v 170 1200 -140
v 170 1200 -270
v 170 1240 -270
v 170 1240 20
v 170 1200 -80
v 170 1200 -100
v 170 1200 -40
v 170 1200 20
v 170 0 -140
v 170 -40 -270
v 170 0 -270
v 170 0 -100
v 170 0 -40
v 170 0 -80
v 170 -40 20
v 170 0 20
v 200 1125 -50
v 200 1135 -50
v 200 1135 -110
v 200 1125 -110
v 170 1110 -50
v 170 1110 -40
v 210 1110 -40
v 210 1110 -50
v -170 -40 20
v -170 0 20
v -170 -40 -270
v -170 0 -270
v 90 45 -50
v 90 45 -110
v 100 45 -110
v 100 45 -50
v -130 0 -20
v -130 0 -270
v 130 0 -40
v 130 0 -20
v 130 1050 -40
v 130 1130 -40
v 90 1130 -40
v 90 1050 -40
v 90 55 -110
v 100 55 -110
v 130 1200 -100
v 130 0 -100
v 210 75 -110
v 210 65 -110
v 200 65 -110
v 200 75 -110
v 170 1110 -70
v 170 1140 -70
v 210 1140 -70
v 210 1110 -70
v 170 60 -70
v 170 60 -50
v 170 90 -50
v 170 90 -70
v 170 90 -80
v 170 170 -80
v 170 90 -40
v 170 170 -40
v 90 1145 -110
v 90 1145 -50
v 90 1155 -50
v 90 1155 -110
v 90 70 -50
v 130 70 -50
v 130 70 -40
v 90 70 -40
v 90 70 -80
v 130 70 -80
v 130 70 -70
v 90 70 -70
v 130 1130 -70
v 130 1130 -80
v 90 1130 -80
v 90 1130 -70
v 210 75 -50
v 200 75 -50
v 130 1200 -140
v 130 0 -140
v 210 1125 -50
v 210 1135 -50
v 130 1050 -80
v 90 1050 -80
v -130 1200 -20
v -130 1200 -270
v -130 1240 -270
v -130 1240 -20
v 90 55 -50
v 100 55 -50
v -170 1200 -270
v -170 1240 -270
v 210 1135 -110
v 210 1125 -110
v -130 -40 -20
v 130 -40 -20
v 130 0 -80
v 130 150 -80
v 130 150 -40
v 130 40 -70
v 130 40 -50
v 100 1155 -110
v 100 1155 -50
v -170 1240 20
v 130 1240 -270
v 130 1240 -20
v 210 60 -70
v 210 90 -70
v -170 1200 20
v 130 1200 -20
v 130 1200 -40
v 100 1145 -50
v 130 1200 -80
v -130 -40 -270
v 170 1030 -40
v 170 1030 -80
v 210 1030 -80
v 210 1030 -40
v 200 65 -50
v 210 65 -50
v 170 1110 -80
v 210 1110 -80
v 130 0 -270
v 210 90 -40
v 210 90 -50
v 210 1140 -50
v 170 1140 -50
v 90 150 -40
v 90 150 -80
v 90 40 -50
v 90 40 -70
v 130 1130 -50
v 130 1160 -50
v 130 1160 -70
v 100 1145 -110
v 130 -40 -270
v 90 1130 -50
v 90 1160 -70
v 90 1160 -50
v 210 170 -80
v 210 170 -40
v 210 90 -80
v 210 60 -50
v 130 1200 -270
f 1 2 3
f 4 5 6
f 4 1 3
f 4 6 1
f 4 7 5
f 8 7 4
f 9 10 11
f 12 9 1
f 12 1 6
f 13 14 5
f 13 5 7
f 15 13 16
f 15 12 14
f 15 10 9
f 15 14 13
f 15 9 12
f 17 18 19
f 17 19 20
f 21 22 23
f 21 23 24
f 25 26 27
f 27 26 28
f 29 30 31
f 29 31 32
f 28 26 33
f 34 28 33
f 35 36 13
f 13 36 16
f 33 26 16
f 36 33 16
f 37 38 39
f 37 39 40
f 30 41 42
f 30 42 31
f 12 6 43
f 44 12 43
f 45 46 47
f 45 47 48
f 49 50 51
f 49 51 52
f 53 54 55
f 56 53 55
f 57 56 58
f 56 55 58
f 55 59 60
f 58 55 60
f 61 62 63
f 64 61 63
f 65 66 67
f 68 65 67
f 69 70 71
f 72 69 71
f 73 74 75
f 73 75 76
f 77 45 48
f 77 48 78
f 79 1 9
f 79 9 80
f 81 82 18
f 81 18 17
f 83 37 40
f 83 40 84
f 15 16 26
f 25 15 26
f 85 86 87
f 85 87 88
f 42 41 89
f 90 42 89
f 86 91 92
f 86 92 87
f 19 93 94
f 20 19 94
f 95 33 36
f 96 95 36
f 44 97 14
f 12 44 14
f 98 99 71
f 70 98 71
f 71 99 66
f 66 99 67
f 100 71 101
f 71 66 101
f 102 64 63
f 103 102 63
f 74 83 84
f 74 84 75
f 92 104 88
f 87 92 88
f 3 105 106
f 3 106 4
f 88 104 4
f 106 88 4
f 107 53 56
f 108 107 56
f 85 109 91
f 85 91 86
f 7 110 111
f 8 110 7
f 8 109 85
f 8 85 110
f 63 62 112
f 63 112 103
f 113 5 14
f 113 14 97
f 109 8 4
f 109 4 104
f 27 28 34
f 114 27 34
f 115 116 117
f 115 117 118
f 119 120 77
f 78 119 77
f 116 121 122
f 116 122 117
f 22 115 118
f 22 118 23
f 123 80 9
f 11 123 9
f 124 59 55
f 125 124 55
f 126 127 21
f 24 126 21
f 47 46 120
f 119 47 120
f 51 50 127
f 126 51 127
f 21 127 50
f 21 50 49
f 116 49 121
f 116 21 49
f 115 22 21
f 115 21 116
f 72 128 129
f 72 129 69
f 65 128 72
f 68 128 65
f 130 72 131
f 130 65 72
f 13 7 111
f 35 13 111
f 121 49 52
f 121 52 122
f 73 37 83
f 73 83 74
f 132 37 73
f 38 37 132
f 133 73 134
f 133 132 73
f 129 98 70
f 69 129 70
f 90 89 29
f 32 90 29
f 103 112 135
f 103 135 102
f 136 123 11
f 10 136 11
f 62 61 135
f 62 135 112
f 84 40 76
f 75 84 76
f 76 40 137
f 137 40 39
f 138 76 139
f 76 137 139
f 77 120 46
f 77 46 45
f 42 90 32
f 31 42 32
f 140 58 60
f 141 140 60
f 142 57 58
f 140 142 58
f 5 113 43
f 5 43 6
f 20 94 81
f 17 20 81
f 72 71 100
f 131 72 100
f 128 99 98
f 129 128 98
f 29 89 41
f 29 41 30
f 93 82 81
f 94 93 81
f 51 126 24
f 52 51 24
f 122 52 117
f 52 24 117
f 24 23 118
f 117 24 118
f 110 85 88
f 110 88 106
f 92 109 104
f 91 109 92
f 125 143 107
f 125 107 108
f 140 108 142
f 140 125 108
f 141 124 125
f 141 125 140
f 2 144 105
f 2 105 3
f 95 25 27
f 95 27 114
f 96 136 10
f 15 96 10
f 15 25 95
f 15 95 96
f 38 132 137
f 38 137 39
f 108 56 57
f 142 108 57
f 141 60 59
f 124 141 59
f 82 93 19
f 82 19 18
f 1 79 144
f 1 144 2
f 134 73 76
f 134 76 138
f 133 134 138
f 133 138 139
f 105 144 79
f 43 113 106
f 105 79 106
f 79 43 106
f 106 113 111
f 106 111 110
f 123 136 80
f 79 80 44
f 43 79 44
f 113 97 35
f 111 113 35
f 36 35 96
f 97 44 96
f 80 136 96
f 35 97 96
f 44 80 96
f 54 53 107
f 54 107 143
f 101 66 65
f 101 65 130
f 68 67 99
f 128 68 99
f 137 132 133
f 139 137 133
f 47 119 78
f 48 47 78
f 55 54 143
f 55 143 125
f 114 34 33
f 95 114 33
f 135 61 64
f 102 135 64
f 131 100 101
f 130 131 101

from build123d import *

# Parameters (mm, degrees)
F0_W      = 40
F0_H      = 250
F1_DEPTH  = 40
F2_W      = 40
F2_H      = 40
F3_DEPTH  = 600
F4_W      = 30
F4_H      = 20
F5_DEPTH  = 40
F6_W      = 10
F6_H      = 60
F7_DEPTH  = 10
F8_W      = 30
F8_H      = 20
F9_DEPTH  = 40
F10_W     = 10
F10_H     = 60
F11_DEPTH = 10


with BuildPart() as f1:
    # F0 (on Front) → F1 (new body)
    with BuildSketch(Plane.XZ):
        Polygon((170, 20), (-170, 20), (-170, -20), (-130, -20), (130, -20), (170, -20), align=None)
        with Locations((-150, -145)):
            Rectangle(F0_W, F0_H)
        with Locations((150, -145)):
            Rectangle(F0_W, F0_H)
    extrude(amount=F1_DEPTH)

    # F2 (on face) → F3 (join)
    with BuildSketch(Plane(origin=(0, 0, 0), x_dir=(-1, 0, 0), z_dir=(0, 1, 0))):
        with Locations((-150, -60)):
            Rectangle(F2_W, F2_H)
        with Locations((-150, -120)):
            Rectangle(F2_W, F2_H)
    extrude(amount=F3_DEPTH)

    # F13: F1 across face


with BuildPart() as f5:
    # F4 (on face) → F5 (new body)
    with BuildSketch(Plane.YZ.offset(170)):
        Polygon((170, -80), (170, -40), (90, -40), (90, -50), (90, -70), (90, -80), align=None)
        with Locations((75, -60)):
            Rectangle(F4_W, F4_H)
    extrude(amount=F5_DEPTH)


with BuildPart() as f7:
    # F6 (on face) → F7 (new body)
    with BuildSketch(Plane.YZ.offset(210)):
        with Locations((70, -80)):
            Rectangle(F6_W, F6_H)
    extrude(amount=-F7_DEPTH)


with BuildPart() as f9:
    # F8 (on face) → F9 (new body)
    with BuildSketch(Plane(origin=(130, 0, 0), x_dir=(0, -1, 0), z_dir=(-1, 0, 0))):
        Polygon((-70, -40), (-150, -40), (-150, -80), (-70, -80), (-70, -70), (-70, -50), align=None)
        with Locations((-55, -60)):
            Rectangle(F8_W, F8_H)
    extrude(amount=F9_DEPTH)


with BuildPart() as f11:
    # F10 (on face) → F11 (new body)
    with BuildSketch(Plane(origin=(90, 0, 0), x_dir=(0, -1, 0), z_dir=(-1, 0, 0))):
        with Locations((-50, -80)):
            Rectangle(F10_W, F10_H)
    extrude(amount=-F11_DEPTH)


with BuildPart() as f12_1:
    # F12: instance of F5
    add(f5.part.mirror(Plane(origin=(150, 600, -60), x_dir=(-1, 0, 0), z_dir=(0, 1, 0))))


with BuildPart() as f12_2:
    # F12: instance of F7
    add(f7.part.mirror(Plane(origin=(150, 600, -60), x_dir=(-1, 0, 0), z_dir=(0, 1, 0))))


with BuildPart() as f12_3:
    # F12: instance of F9
    add(f9.part.mirror(Plane(origin=(150, 600, -60), x_dir=(-1, 0, 0), z_dir=(0, 1, 0))))


with BuildPart() as f12_4:
    # F12: instance of F11
    add(f11.part.mirror(Plane(origin=(150, 600, -60), x_dir=(-1, 0, 0), z_dir=(0, 1, 0))))


with BuildPart() as f1_1:
    add(f1.part)
    add(f1.part.mirror(Plane(origin=(150, 600, -60), x_dir=(-1, 0, 0), z_dir=(0, 1, 0))))


solid = Compound([f5.part, f7.part, f9.part, f11.part, f12_1.part, f12_2.part, f12_3.part, f12_4.part, f1_1.part])
